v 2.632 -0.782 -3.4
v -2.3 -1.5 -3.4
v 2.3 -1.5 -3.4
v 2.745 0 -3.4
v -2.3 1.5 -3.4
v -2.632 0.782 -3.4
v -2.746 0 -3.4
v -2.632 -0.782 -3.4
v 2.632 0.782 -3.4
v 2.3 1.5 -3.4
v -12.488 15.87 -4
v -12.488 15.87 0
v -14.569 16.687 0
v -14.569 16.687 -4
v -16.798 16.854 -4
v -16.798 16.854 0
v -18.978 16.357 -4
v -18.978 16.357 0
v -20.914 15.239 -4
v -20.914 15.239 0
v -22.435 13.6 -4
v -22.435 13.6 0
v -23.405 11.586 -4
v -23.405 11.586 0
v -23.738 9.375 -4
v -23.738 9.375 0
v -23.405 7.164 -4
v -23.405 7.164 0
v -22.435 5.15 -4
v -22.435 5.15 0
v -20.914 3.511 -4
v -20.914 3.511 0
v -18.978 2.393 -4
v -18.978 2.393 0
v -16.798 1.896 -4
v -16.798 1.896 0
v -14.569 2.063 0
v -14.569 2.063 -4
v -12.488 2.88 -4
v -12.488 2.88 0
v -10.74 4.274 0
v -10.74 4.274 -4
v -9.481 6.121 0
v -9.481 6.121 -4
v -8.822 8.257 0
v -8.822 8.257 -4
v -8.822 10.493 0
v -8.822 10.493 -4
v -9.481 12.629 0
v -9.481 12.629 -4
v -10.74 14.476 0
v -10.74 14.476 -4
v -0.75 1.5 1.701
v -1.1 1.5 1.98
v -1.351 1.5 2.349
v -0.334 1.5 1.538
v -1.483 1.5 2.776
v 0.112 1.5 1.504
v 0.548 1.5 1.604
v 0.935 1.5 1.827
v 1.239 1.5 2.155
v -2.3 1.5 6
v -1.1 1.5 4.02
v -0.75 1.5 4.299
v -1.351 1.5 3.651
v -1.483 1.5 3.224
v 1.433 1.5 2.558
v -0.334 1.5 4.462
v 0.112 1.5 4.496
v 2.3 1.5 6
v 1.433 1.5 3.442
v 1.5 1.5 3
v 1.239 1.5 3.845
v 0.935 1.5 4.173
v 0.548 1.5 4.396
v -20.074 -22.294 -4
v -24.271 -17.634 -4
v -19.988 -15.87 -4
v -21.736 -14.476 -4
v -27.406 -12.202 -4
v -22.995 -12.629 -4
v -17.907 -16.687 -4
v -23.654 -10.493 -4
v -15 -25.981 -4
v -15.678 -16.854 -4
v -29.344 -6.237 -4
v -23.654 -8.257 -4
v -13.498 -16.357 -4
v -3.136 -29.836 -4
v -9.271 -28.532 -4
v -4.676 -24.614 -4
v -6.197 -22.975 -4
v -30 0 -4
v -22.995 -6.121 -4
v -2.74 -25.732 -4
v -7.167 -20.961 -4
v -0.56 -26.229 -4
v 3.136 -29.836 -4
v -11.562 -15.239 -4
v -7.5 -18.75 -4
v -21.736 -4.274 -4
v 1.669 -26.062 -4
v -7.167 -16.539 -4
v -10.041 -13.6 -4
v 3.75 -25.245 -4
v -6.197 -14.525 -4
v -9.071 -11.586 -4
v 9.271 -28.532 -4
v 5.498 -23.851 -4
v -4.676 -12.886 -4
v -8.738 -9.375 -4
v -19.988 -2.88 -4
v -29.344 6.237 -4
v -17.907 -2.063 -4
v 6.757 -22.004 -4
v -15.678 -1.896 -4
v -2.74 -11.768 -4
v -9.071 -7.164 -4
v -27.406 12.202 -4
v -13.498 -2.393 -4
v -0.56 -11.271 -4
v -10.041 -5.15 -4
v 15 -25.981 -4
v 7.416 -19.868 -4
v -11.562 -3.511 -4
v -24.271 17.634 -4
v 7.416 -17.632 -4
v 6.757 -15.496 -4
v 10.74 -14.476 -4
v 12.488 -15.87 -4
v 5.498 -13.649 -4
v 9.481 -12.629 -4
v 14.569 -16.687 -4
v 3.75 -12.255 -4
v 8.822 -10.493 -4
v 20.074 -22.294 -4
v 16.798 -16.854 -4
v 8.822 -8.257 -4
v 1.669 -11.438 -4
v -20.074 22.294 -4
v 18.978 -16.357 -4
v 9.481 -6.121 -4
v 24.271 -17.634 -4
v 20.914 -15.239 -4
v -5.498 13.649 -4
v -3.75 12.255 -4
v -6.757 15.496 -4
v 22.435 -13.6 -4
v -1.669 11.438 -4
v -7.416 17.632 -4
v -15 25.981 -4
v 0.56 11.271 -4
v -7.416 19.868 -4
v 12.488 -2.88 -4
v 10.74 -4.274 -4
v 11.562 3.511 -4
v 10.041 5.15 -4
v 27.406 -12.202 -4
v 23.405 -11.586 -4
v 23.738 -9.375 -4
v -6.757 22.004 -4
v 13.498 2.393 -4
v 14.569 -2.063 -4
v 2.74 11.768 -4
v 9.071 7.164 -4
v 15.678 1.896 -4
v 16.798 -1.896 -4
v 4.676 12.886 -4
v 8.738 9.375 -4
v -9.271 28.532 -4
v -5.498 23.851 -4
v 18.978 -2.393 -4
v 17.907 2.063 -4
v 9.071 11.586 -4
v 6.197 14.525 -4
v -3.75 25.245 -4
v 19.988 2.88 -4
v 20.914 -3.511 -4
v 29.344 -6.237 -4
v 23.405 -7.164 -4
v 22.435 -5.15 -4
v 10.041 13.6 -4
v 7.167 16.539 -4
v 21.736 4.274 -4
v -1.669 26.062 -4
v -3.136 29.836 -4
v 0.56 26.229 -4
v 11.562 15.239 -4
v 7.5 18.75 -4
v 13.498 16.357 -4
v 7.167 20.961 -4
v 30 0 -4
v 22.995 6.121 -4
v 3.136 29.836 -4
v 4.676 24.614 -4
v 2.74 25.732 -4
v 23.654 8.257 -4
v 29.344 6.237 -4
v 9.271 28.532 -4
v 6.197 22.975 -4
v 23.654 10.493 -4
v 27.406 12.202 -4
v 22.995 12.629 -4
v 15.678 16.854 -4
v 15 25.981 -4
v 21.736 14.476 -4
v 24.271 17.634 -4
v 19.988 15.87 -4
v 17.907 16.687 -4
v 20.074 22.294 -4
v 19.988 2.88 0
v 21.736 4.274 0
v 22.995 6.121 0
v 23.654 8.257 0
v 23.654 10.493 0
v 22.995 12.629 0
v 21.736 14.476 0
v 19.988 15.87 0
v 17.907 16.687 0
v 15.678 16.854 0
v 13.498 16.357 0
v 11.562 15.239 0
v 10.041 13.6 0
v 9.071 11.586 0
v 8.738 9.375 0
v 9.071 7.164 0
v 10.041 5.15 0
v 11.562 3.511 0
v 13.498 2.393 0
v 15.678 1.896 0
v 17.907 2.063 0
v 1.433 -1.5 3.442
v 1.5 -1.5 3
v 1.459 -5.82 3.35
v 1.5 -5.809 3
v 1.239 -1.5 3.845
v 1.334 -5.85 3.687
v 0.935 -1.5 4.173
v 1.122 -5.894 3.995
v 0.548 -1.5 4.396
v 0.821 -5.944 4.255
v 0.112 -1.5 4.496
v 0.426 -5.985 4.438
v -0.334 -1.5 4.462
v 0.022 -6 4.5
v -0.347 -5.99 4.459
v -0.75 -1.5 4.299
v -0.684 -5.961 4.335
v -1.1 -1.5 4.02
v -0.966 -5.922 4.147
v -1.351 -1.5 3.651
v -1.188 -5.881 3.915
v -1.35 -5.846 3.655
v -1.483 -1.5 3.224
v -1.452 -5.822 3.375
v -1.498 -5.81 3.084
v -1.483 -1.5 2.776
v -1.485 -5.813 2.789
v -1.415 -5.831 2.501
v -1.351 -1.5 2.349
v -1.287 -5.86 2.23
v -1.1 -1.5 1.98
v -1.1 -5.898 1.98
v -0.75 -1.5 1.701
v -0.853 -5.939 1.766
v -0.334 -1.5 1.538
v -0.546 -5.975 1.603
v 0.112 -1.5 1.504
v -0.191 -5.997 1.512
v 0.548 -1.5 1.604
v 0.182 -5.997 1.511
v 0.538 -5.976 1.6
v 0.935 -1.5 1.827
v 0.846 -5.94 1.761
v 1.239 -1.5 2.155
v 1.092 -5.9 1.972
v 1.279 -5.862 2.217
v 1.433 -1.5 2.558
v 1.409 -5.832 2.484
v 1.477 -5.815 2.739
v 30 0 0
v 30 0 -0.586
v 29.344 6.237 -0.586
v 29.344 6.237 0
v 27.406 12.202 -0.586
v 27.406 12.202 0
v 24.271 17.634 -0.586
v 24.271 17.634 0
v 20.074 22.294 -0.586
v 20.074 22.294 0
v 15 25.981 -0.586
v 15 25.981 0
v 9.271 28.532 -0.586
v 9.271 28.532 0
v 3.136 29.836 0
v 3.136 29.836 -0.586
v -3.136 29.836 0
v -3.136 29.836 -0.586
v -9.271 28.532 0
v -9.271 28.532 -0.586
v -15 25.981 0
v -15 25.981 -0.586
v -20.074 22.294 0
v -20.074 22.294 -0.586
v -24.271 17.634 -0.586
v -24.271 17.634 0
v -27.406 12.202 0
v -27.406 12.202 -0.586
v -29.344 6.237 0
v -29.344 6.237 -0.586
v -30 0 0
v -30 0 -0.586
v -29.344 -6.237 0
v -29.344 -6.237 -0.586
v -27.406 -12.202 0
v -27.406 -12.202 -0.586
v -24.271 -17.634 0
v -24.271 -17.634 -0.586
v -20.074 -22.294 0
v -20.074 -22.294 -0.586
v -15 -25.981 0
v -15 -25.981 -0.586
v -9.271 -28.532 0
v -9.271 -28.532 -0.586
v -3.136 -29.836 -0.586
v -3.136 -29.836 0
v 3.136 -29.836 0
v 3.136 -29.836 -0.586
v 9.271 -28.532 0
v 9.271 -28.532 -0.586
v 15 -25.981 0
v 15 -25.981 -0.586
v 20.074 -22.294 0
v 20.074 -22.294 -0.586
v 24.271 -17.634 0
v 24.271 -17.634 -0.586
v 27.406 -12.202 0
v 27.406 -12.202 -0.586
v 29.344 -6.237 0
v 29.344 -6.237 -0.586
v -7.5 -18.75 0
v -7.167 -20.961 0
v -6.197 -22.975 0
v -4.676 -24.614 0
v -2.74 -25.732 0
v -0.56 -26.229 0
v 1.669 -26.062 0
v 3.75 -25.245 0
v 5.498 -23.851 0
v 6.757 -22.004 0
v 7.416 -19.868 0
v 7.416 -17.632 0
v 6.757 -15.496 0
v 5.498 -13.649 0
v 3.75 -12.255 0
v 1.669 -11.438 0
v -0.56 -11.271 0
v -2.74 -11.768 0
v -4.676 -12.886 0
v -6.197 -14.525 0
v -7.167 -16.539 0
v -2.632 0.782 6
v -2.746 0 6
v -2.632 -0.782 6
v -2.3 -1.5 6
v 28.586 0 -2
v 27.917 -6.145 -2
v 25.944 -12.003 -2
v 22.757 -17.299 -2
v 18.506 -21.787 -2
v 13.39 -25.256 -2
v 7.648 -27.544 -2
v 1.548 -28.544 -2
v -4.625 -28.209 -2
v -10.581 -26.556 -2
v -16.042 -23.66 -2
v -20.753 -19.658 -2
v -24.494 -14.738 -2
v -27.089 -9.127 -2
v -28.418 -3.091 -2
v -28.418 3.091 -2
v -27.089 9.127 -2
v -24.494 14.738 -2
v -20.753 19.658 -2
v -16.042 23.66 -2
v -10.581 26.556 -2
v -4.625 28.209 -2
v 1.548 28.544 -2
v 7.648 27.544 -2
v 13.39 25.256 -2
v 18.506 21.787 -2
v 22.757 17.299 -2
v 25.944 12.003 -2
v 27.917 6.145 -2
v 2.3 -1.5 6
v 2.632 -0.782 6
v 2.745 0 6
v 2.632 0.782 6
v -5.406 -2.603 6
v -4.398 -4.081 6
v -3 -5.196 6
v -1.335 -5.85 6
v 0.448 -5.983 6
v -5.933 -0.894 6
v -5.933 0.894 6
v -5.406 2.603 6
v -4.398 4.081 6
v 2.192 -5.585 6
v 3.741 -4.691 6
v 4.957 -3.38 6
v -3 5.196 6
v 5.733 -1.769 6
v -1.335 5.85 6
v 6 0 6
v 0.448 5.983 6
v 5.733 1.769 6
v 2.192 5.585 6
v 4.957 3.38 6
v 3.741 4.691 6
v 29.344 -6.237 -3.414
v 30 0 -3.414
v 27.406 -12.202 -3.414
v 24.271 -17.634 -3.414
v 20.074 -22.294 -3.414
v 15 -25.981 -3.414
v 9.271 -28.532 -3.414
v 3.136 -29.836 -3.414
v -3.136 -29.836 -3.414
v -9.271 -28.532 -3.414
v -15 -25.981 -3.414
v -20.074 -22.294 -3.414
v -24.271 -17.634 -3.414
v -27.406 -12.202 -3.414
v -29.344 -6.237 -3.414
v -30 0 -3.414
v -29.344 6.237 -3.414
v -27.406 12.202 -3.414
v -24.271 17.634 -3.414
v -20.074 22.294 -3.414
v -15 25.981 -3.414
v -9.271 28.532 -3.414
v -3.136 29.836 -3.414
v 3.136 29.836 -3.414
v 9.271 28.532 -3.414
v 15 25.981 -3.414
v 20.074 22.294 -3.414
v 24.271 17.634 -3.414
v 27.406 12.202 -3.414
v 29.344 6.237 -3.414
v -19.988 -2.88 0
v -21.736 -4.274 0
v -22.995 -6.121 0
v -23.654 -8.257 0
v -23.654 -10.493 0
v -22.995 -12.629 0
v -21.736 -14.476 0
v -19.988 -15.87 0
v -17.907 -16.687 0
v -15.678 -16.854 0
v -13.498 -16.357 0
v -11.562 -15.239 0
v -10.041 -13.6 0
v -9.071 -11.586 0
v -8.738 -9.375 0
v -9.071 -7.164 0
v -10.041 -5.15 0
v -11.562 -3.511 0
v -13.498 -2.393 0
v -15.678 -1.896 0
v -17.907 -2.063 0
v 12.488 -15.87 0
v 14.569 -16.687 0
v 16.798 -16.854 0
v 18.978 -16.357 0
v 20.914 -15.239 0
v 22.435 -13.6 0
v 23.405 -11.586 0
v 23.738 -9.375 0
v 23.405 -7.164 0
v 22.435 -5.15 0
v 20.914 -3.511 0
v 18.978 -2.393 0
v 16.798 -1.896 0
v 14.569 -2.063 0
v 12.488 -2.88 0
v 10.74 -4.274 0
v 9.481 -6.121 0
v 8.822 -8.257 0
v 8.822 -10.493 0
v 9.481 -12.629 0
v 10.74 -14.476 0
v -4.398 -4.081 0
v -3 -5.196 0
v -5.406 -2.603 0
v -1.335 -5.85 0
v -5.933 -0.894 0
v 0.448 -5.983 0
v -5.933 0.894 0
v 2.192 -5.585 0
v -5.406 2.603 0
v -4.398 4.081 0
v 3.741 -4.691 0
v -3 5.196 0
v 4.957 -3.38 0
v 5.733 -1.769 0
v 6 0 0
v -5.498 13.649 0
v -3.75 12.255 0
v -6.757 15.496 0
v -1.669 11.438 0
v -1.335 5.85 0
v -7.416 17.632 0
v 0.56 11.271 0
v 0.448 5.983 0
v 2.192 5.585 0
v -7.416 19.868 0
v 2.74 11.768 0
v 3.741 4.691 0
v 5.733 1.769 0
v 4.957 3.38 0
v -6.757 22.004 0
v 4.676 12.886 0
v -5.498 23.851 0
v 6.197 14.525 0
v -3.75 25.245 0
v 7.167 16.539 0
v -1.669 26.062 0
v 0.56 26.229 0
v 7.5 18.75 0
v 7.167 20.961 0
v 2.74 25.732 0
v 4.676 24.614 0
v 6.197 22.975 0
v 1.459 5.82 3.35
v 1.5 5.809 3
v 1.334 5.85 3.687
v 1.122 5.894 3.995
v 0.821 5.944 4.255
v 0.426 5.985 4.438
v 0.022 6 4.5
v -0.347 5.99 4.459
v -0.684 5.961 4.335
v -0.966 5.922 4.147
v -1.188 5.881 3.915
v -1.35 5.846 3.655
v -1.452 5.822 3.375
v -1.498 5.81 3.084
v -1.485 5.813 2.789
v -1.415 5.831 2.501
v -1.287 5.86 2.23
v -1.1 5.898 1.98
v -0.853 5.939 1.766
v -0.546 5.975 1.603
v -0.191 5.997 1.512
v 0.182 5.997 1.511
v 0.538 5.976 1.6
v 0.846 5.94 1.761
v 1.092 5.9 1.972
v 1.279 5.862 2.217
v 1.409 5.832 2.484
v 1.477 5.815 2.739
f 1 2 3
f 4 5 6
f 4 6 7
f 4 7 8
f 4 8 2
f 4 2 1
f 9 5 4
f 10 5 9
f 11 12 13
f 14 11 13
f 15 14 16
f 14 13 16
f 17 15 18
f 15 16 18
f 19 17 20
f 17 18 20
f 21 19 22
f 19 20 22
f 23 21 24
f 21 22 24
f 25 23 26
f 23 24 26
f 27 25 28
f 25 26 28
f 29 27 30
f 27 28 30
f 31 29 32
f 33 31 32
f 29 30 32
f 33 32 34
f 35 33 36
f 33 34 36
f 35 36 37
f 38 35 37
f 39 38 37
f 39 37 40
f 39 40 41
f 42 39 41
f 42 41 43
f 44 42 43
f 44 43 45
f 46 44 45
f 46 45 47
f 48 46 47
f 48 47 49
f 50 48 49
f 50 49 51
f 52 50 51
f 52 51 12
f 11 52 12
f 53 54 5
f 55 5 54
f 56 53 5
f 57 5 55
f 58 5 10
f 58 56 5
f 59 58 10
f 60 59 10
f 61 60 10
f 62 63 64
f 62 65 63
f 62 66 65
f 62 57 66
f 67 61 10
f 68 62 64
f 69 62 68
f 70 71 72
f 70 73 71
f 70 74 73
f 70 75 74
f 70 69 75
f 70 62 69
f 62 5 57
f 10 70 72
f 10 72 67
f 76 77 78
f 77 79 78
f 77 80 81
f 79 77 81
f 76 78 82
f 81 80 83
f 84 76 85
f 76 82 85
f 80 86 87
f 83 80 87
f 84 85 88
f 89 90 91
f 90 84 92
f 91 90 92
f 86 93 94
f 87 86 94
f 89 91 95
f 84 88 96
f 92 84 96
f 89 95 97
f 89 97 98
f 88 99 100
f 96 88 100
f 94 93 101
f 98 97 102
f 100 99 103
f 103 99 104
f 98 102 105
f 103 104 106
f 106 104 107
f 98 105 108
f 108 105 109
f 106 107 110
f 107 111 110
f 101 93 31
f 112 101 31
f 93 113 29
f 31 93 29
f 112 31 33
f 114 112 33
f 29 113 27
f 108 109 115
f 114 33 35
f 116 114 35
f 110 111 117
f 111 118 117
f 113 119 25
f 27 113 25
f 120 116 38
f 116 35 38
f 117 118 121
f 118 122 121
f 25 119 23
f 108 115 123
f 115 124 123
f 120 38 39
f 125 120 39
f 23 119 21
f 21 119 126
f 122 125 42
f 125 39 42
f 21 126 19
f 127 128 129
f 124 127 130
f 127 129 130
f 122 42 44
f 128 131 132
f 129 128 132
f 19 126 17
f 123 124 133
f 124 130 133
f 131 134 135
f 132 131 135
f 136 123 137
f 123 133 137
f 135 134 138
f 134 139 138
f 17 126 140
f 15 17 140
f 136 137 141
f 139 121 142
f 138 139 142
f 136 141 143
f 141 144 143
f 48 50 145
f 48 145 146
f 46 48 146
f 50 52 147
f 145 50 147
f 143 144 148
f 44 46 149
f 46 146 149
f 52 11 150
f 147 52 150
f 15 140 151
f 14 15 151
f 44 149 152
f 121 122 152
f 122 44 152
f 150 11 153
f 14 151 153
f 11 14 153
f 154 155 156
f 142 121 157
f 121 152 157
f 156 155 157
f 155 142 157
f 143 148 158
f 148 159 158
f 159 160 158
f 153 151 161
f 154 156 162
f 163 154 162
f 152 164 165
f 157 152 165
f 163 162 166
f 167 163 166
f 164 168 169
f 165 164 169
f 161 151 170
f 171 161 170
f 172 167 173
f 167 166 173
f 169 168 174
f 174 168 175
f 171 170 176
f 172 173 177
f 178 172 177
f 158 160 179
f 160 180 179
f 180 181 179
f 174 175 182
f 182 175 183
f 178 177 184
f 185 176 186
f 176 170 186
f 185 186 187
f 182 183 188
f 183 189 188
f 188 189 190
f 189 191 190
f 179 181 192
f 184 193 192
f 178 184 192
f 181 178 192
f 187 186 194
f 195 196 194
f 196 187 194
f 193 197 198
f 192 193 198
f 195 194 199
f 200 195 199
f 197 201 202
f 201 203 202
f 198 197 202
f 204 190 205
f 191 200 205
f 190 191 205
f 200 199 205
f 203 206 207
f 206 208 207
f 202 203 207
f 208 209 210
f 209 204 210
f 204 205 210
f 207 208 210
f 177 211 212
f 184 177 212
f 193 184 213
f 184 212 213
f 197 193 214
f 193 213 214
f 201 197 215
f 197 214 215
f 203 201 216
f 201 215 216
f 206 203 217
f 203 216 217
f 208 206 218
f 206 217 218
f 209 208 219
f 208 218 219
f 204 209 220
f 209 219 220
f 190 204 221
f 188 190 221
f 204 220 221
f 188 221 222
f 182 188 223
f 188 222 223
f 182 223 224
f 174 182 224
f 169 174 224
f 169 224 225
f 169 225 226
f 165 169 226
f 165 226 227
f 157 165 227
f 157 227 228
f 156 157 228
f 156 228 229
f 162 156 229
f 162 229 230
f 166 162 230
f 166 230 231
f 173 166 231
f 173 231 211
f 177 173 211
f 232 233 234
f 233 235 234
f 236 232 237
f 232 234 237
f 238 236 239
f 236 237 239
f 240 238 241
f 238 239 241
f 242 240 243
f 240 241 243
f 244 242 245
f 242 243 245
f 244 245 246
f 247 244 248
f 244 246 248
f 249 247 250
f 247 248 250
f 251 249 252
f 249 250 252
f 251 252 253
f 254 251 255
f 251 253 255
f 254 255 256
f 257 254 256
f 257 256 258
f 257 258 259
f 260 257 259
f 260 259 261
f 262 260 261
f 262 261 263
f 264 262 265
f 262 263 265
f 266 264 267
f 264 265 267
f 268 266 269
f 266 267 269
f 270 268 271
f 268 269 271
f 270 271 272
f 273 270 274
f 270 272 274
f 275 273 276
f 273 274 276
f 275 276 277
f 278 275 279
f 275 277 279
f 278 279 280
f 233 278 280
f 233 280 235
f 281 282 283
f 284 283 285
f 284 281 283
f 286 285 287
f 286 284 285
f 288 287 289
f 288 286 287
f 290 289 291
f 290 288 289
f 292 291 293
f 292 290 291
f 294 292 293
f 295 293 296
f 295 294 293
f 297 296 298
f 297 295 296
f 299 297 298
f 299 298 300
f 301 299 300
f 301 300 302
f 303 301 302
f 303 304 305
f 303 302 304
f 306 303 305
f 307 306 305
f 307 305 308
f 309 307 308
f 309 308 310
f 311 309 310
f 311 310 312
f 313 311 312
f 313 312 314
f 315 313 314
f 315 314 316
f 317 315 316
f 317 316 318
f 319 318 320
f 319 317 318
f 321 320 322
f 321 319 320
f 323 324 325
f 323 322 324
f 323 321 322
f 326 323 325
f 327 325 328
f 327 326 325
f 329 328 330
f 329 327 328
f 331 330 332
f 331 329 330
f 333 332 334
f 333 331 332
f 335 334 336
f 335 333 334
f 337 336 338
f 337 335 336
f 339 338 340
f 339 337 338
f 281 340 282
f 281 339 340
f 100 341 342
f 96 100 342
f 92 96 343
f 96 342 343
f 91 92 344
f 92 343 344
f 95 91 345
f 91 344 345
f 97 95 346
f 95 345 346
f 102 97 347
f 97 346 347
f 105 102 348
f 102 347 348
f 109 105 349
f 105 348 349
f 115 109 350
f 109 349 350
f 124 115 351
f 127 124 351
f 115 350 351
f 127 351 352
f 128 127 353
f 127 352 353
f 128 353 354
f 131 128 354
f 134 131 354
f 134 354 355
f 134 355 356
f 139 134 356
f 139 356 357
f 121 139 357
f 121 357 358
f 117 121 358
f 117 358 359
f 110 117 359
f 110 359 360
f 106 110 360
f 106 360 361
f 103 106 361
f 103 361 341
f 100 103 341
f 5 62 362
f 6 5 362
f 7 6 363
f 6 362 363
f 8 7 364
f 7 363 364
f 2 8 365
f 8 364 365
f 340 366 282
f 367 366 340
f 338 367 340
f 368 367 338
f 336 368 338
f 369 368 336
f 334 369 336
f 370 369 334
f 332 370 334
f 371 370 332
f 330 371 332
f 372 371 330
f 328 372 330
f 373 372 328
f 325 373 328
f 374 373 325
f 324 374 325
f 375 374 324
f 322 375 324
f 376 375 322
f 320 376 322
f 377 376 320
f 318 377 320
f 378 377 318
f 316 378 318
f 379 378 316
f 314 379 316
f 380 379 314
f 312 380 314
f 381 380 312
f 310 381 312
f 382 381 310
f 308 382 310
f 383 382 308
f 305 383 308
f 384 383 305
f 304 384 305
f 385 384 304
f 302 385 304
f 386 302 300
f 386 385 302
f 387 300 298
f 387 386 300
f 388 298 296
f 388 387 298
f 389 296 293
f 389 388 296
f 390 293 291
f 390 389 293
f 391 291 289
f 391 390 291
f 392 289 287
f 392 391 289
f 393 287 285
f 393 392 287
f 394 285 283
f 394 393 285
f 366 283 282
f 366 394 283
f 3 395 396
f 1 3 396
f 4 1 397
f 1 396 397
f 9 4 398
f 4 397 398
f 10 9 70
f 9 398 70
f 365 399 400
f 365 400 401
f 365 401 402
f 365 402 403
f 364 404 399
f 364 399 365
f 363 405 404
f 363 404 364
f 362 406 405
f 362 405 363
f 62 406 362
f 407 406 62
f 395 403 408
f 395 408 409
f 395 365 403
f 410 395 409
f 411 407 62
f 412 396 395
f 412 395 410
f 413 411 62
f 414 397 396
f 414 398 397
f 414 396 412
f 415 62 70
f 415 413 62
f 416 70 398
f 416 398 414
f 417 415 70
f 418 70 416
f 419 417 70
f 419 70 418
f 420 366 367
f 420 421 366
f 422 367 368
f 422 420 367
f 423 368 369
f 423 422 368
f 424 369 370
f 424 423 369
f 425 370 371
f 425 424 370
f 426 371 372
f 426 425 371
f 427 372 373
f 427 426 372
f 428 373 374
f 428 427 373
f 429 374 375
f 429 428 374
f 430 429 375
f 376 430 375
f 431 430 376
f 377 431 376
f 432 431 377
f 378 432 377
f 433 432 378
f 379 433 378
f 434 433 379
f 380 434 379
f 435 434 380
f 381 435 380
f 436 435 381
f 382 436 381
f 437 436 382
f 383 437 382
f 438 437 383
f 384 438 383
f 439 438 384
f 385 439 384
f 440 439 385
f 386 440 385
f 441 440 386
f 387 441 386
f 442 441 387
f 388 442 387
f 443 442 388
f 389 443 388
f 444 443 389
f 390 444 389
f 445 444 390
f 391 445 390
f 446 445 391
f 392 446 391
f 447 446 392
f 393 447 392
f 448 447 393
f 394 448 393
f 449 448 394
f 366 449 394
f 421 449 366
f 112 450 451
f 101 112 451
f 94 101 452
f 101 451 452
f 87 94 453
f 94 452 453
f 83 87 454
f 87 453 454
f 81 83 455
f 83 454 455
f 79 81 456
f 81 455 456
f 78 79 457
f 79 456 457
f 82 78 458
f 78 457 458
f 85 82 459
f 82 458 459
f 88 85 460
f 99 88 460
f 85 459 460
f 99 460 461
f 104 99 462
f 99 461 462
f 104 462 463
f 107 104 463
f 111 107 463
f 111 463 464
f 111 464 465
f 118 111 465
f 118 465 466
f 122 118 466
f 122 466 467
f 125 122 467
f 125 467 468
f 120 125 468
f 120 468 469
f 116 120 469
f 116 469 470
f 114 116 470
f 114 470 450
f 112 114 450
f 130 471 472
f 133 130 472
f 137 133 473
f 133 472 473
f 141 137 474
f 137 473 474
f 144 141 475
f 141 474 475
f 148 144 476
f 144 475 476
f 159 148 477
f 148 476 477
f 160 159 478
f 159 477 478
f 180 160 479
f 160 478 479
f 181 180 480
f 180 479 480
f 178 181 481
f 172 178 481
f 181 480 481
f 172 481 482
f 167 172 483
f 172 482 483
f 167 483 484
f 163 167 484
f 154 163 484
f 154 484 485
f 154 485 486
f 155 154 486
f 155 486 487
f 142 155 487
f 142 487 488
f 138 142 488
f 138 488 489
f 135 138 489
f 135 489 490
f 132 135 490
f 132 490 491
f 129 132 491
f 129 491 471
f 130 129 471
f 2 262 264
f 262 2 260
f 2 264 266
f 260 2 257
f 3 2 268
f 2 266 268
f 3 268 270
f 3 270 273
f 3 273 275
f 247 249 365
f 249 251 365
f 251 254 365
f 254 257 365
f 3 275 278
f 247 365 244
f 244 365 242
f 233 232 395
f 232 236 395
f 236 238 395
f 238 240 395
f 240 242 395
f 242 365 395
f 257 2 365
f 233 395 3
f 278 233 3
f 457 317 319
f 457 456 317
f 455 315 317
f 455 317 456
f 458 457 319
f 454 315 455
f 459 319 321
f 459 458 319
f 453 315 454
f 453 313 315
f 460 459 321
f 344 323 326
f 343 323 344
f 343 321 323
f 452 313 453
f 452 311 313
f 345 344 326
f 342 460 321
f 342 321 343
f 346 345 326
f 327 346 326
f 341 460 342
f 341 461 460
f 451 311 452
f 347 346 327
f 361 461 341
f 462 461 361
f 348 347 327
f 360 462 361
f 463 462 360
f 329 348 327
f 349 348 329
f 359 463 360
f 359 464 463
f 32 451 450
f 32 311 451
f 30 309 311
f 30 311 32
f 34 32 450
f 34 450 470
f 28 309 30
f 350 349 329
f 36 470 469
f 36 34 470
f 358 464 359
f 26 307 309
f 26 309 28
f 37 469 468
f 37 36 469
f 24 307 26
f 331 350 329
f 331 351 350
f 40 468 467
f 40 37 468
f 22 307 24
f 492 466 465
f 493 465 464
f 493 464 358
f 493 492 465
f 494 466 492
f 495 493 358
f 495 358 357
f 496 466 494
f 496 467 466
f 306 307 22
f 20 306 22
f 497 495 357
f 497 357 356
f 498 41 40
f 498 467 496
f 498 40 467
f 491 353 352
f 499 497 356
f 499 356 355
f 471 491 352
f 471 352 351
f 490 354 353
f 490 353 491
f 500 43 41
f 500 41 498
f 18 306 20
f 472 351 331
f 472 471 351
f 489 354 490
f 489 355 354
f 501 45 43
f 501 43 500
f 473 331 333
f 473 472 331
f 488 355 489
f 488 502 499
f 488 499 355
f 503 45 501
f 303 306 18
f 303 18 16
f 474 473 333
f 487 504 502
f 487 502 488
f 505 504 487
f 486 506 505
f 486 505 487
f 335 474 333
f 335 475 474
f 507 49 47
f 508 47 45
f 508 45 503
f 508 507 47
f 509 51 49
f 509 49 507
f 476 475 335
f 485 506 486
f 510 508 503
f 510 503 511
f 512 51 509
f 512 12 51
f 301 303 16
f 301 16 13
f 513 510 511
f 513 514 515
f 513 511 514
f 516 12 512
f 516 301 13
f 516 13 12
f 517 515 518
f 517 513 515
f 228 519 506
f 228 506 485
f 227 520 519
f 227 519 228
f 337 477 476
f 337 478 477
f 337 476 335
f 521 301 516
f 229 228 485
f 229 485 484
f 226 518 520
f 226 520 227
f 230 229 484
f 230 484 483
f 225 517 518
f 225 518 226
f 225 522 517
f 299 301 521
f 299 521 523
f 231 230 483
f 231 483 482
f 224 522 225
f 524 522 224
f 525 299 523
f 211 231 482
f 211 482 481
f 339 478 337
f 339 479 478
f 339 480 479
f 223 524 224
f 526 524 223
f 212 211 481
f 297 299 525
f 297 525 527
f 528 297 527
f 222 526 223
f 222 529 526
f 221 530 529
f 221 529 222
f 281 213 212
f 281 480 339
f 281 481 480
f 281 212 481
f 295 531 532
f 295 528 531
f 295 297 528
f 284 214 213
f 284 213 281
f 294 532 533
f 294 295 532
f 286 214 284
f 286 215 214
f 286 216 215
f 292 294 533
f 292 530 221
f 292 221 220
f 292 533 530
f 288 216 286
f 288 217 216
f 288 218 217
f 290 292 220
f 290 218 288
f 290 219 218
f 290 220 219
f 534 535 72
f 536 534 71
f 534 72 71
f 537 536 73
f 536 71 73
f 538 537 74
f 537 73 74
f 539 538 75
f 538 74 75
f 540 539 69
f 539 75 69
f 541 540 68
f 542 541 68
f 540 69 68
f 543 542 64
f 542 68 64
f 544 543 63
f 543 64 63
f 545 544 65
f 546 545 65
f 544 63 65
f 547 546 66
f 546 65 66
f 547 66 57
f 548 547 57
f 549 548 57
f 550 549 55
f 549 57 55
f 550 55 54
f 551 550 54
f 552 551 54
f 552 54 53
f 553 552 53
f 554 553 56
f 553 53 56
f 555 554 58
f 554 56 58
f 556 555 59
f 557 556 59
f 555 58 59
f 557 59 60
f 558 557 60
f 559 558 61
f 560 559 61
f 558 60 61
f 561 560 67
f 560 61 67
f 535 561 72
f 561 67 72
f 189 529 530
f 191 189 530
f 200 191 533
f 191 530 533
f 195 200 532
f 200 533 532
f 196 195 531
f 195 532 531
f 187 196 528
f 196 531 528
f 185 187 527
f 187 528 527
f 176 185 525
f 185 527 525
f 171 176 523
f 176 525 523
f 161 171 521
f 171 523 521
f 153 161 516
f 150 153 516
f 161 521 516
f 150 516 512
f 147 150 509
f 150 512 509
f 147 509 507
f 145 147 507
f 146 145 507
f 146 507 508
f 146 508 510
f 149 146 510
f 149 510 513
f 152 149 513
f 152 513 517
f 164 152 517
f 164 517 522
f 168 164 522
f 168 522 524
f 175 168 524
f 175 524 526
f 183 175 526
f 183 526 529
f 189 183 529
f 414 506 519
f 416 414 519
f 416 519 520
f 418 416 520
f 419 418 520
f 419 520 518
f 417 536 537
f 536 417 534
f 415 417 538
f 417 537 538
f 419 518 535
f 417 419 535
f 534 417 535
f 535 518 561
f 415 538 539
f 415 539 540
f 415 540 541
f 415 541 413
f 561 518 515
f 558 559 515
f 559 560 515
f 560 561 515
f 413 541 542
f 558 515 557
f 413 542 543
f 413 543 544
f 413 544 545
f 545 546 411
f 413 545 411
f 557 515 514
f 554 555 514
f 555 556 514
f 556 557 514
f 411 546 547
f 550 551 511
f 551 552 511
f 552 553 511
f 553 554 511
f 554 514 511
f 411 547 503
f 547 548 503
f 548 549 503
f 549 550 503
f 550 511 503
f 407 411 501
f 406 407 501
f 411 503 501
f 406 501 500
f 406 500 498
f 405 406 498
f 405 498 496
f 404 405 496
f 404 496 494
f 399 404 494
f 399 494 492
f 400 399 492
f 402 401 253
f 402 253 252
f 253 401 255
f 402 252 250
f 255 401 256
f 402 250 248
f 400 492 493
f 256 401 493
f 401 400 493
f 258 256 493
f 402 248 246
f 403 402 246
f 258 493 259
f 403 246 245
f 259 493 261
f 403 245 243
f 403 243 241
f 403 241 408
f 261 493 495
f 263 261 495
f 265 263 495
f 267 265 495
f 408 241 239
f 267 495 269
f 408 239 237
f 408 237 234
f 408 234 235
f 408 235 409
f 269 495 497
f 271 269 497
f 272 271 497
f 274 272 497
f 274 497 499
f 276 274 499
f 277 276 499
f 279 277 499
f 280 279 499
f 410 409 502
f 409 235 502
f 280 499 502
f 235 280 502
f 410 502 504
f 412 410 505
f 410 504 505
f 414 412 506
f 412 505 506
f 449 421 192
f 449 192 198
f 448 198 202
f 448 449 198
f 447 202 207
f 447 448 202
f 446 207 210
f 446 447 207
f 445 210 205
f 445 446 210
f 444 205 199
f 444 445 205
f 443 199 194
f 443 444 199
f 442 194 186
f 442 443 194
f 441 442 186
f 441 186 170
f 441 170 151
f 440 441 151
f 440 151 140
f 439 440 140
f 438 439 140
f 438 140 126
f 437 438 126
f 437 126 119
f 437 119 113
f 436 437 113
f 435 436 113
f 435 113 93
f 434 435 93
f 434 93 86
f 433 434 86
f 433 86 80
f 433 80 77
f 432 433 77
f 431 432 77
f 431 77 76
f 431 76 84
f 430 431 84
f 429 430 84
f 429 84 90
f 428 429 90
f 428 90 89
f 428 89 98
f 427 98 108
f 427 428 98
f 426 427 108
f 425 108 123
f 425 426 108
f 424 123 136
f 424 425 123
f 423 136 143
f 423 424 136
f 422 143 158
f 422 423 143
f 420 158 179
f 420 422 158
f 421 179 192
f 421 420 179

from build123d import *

# Parameters (mm, degrees)
F0_R             = 30
F0_R_2           = 6
F1_DEPTH         = 4
F2_DEPTH         = 6
F3_R             = 1.5
F4_DEPTH         = 12.5
F5_W             = 4.6
F5_H             = 3
F6_DEPTH         = 9.4
F9_R             = 7.5
F10_DEPTH        = 25
F10_COPIES_COUNT = 6


# Not quite as in the source:
# - a pattern or mirror of a feature is missing from the dataset's text; its kind, count and spacing are read off the source's solid


with BuildPart() as f1:
    # F0 (on Top) → F1 (new body)
    with BuildSketch(Plane.XY):
        Circle(F0_R)
        Circle(F0_R_2, mode=Mode.SUBTRACT)
        Circle(F0_R_2)
    extrude(amount=-F1_DEPTH)

    # F0 (on Top) → F2 (join)
    with BuildSketch(Plane.XY):
        Circle(F0_R_2)
    extrude(amount=F2_DEPTH)

    # F3 (on Front) → F4 (cut, symmetric)
    with BuildSketch(Plane.XZ):
        with Locations((0, 3)):
            Circle(F3_R)
    extrude(amount=F4_DEPTH, both=True, mode=Mode.SUBTRACT)

    # F5 (on face) → F6 (cut)
    with BuildSketch(Plane.XY.offset(6)):
        Rectangle(F5_W, F5_H)
        with BuildLine():
            ThreePointArc((-2.3, 1.5), (-2.7459060435, 0), (-2.3, -1.5))
            Line((-2.3, -1.5), (-2.3, 1.5))
        make_face()
        with BuildLine():
            Line((2.3, 1.5), (2.3, -1.5))
            ThreePointArc((2.3, -1.5), (2.745183651, 0), (2.3, 1.5))
        make_face()
    extrude(amount=-F6_DEPTH, mode=Mode.SUBTRACT)

    # F7 (on Front) → F8 (revolve, cut)
    with BuildSketch(Plane.XZ):
        Polygon((30, -3.4142135624), (30, -0.5857864376), (28.5857864376, -2), align=None)
    revolve(axis=Axis((0, 0, 0.7614716887), (0, 0, -1)), mode=Mode.SUBTRACT)

    # F9 (on face) → F10 (cut)
    with BuildSketch(Plane.XY):
        with Locations((0, 18.75)):
            Circle(F9_R)
    f10 = extrude(amount=-F10_DEPTH, mode=Mode.SUBTRACT)

    # F10_copies: F10 ×6 about axis
    f10_copies_axis = Axis((0, 0, 0), (0, 0, 1))
    for i in range(1, F10_COPIES_COUNT):
        add(f10.rotate(f10_copies_axis, i * 360 / F10_COPIES_COUNT), mode=Mode.SUBTRACT)


solid = f1.part
